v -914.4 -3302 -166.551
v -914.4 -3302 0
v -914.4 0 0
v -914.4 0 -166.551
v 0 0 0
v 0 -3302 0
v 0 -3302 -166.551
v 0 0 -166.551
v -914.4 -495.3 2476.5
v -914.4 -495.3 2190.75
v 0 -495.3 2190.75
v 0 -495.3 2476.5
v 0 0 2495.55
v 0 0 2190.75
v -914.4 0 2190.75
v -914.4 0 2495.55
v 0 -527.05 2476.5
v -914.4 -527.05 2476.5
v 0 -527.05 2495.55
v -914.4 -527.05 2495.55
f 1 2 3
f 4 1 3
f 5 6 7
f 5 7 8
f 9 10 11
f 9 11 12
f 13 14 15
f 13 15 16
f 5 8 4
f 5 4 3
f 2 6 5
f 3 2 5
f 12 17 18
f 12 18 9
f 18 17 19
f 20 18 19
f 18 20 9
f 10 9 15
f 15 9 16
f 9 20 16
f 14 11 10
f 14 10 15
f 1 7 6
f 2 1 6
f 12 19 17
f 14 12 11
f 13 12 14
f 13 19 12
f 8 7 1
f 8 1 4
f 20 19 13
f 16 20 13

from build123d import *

# Parameters (mm, degrees)
F0_W     = 495.3
F0_H     = 304.8
F1_DEPTH = 914.4
F2_W     = 31.75
F2_H     = 19.05
F3_DEPTH = 914.4
F4_W     = 3302
F4_H     = 166.5514114483
F5_DEPTH = 914.4


with BuildPart() as f1:
    # F0 (on Right) → F1 (new body)
    with BuildSketch(Plane.YZ):
        with Locations((-247.65, 2343.15)):
            Rectangle(F0_W, F0_H)
    extrude(amount=-F1_DEPTH)

    # F2 (on face) → F3 (join, through all)
    with BuildSketch(Plane.YZ):
        with Locations((-511.175, 2486.025)):
            Rectangle(F2_W, F2_H)
    extrude(amount=-F3_DEPTH)


with BuildPart() as f5:
    # F4 (on Right) → F5 (new body)
    with BuildSketch(Plane.YZ):
        with Locations((-1651, -83.2757057242)):
            Rectangle(F4_W, F4_H)
    extrude(amount=-F5_DEPTH)


solid = Compound([f1.part, f5.part])
